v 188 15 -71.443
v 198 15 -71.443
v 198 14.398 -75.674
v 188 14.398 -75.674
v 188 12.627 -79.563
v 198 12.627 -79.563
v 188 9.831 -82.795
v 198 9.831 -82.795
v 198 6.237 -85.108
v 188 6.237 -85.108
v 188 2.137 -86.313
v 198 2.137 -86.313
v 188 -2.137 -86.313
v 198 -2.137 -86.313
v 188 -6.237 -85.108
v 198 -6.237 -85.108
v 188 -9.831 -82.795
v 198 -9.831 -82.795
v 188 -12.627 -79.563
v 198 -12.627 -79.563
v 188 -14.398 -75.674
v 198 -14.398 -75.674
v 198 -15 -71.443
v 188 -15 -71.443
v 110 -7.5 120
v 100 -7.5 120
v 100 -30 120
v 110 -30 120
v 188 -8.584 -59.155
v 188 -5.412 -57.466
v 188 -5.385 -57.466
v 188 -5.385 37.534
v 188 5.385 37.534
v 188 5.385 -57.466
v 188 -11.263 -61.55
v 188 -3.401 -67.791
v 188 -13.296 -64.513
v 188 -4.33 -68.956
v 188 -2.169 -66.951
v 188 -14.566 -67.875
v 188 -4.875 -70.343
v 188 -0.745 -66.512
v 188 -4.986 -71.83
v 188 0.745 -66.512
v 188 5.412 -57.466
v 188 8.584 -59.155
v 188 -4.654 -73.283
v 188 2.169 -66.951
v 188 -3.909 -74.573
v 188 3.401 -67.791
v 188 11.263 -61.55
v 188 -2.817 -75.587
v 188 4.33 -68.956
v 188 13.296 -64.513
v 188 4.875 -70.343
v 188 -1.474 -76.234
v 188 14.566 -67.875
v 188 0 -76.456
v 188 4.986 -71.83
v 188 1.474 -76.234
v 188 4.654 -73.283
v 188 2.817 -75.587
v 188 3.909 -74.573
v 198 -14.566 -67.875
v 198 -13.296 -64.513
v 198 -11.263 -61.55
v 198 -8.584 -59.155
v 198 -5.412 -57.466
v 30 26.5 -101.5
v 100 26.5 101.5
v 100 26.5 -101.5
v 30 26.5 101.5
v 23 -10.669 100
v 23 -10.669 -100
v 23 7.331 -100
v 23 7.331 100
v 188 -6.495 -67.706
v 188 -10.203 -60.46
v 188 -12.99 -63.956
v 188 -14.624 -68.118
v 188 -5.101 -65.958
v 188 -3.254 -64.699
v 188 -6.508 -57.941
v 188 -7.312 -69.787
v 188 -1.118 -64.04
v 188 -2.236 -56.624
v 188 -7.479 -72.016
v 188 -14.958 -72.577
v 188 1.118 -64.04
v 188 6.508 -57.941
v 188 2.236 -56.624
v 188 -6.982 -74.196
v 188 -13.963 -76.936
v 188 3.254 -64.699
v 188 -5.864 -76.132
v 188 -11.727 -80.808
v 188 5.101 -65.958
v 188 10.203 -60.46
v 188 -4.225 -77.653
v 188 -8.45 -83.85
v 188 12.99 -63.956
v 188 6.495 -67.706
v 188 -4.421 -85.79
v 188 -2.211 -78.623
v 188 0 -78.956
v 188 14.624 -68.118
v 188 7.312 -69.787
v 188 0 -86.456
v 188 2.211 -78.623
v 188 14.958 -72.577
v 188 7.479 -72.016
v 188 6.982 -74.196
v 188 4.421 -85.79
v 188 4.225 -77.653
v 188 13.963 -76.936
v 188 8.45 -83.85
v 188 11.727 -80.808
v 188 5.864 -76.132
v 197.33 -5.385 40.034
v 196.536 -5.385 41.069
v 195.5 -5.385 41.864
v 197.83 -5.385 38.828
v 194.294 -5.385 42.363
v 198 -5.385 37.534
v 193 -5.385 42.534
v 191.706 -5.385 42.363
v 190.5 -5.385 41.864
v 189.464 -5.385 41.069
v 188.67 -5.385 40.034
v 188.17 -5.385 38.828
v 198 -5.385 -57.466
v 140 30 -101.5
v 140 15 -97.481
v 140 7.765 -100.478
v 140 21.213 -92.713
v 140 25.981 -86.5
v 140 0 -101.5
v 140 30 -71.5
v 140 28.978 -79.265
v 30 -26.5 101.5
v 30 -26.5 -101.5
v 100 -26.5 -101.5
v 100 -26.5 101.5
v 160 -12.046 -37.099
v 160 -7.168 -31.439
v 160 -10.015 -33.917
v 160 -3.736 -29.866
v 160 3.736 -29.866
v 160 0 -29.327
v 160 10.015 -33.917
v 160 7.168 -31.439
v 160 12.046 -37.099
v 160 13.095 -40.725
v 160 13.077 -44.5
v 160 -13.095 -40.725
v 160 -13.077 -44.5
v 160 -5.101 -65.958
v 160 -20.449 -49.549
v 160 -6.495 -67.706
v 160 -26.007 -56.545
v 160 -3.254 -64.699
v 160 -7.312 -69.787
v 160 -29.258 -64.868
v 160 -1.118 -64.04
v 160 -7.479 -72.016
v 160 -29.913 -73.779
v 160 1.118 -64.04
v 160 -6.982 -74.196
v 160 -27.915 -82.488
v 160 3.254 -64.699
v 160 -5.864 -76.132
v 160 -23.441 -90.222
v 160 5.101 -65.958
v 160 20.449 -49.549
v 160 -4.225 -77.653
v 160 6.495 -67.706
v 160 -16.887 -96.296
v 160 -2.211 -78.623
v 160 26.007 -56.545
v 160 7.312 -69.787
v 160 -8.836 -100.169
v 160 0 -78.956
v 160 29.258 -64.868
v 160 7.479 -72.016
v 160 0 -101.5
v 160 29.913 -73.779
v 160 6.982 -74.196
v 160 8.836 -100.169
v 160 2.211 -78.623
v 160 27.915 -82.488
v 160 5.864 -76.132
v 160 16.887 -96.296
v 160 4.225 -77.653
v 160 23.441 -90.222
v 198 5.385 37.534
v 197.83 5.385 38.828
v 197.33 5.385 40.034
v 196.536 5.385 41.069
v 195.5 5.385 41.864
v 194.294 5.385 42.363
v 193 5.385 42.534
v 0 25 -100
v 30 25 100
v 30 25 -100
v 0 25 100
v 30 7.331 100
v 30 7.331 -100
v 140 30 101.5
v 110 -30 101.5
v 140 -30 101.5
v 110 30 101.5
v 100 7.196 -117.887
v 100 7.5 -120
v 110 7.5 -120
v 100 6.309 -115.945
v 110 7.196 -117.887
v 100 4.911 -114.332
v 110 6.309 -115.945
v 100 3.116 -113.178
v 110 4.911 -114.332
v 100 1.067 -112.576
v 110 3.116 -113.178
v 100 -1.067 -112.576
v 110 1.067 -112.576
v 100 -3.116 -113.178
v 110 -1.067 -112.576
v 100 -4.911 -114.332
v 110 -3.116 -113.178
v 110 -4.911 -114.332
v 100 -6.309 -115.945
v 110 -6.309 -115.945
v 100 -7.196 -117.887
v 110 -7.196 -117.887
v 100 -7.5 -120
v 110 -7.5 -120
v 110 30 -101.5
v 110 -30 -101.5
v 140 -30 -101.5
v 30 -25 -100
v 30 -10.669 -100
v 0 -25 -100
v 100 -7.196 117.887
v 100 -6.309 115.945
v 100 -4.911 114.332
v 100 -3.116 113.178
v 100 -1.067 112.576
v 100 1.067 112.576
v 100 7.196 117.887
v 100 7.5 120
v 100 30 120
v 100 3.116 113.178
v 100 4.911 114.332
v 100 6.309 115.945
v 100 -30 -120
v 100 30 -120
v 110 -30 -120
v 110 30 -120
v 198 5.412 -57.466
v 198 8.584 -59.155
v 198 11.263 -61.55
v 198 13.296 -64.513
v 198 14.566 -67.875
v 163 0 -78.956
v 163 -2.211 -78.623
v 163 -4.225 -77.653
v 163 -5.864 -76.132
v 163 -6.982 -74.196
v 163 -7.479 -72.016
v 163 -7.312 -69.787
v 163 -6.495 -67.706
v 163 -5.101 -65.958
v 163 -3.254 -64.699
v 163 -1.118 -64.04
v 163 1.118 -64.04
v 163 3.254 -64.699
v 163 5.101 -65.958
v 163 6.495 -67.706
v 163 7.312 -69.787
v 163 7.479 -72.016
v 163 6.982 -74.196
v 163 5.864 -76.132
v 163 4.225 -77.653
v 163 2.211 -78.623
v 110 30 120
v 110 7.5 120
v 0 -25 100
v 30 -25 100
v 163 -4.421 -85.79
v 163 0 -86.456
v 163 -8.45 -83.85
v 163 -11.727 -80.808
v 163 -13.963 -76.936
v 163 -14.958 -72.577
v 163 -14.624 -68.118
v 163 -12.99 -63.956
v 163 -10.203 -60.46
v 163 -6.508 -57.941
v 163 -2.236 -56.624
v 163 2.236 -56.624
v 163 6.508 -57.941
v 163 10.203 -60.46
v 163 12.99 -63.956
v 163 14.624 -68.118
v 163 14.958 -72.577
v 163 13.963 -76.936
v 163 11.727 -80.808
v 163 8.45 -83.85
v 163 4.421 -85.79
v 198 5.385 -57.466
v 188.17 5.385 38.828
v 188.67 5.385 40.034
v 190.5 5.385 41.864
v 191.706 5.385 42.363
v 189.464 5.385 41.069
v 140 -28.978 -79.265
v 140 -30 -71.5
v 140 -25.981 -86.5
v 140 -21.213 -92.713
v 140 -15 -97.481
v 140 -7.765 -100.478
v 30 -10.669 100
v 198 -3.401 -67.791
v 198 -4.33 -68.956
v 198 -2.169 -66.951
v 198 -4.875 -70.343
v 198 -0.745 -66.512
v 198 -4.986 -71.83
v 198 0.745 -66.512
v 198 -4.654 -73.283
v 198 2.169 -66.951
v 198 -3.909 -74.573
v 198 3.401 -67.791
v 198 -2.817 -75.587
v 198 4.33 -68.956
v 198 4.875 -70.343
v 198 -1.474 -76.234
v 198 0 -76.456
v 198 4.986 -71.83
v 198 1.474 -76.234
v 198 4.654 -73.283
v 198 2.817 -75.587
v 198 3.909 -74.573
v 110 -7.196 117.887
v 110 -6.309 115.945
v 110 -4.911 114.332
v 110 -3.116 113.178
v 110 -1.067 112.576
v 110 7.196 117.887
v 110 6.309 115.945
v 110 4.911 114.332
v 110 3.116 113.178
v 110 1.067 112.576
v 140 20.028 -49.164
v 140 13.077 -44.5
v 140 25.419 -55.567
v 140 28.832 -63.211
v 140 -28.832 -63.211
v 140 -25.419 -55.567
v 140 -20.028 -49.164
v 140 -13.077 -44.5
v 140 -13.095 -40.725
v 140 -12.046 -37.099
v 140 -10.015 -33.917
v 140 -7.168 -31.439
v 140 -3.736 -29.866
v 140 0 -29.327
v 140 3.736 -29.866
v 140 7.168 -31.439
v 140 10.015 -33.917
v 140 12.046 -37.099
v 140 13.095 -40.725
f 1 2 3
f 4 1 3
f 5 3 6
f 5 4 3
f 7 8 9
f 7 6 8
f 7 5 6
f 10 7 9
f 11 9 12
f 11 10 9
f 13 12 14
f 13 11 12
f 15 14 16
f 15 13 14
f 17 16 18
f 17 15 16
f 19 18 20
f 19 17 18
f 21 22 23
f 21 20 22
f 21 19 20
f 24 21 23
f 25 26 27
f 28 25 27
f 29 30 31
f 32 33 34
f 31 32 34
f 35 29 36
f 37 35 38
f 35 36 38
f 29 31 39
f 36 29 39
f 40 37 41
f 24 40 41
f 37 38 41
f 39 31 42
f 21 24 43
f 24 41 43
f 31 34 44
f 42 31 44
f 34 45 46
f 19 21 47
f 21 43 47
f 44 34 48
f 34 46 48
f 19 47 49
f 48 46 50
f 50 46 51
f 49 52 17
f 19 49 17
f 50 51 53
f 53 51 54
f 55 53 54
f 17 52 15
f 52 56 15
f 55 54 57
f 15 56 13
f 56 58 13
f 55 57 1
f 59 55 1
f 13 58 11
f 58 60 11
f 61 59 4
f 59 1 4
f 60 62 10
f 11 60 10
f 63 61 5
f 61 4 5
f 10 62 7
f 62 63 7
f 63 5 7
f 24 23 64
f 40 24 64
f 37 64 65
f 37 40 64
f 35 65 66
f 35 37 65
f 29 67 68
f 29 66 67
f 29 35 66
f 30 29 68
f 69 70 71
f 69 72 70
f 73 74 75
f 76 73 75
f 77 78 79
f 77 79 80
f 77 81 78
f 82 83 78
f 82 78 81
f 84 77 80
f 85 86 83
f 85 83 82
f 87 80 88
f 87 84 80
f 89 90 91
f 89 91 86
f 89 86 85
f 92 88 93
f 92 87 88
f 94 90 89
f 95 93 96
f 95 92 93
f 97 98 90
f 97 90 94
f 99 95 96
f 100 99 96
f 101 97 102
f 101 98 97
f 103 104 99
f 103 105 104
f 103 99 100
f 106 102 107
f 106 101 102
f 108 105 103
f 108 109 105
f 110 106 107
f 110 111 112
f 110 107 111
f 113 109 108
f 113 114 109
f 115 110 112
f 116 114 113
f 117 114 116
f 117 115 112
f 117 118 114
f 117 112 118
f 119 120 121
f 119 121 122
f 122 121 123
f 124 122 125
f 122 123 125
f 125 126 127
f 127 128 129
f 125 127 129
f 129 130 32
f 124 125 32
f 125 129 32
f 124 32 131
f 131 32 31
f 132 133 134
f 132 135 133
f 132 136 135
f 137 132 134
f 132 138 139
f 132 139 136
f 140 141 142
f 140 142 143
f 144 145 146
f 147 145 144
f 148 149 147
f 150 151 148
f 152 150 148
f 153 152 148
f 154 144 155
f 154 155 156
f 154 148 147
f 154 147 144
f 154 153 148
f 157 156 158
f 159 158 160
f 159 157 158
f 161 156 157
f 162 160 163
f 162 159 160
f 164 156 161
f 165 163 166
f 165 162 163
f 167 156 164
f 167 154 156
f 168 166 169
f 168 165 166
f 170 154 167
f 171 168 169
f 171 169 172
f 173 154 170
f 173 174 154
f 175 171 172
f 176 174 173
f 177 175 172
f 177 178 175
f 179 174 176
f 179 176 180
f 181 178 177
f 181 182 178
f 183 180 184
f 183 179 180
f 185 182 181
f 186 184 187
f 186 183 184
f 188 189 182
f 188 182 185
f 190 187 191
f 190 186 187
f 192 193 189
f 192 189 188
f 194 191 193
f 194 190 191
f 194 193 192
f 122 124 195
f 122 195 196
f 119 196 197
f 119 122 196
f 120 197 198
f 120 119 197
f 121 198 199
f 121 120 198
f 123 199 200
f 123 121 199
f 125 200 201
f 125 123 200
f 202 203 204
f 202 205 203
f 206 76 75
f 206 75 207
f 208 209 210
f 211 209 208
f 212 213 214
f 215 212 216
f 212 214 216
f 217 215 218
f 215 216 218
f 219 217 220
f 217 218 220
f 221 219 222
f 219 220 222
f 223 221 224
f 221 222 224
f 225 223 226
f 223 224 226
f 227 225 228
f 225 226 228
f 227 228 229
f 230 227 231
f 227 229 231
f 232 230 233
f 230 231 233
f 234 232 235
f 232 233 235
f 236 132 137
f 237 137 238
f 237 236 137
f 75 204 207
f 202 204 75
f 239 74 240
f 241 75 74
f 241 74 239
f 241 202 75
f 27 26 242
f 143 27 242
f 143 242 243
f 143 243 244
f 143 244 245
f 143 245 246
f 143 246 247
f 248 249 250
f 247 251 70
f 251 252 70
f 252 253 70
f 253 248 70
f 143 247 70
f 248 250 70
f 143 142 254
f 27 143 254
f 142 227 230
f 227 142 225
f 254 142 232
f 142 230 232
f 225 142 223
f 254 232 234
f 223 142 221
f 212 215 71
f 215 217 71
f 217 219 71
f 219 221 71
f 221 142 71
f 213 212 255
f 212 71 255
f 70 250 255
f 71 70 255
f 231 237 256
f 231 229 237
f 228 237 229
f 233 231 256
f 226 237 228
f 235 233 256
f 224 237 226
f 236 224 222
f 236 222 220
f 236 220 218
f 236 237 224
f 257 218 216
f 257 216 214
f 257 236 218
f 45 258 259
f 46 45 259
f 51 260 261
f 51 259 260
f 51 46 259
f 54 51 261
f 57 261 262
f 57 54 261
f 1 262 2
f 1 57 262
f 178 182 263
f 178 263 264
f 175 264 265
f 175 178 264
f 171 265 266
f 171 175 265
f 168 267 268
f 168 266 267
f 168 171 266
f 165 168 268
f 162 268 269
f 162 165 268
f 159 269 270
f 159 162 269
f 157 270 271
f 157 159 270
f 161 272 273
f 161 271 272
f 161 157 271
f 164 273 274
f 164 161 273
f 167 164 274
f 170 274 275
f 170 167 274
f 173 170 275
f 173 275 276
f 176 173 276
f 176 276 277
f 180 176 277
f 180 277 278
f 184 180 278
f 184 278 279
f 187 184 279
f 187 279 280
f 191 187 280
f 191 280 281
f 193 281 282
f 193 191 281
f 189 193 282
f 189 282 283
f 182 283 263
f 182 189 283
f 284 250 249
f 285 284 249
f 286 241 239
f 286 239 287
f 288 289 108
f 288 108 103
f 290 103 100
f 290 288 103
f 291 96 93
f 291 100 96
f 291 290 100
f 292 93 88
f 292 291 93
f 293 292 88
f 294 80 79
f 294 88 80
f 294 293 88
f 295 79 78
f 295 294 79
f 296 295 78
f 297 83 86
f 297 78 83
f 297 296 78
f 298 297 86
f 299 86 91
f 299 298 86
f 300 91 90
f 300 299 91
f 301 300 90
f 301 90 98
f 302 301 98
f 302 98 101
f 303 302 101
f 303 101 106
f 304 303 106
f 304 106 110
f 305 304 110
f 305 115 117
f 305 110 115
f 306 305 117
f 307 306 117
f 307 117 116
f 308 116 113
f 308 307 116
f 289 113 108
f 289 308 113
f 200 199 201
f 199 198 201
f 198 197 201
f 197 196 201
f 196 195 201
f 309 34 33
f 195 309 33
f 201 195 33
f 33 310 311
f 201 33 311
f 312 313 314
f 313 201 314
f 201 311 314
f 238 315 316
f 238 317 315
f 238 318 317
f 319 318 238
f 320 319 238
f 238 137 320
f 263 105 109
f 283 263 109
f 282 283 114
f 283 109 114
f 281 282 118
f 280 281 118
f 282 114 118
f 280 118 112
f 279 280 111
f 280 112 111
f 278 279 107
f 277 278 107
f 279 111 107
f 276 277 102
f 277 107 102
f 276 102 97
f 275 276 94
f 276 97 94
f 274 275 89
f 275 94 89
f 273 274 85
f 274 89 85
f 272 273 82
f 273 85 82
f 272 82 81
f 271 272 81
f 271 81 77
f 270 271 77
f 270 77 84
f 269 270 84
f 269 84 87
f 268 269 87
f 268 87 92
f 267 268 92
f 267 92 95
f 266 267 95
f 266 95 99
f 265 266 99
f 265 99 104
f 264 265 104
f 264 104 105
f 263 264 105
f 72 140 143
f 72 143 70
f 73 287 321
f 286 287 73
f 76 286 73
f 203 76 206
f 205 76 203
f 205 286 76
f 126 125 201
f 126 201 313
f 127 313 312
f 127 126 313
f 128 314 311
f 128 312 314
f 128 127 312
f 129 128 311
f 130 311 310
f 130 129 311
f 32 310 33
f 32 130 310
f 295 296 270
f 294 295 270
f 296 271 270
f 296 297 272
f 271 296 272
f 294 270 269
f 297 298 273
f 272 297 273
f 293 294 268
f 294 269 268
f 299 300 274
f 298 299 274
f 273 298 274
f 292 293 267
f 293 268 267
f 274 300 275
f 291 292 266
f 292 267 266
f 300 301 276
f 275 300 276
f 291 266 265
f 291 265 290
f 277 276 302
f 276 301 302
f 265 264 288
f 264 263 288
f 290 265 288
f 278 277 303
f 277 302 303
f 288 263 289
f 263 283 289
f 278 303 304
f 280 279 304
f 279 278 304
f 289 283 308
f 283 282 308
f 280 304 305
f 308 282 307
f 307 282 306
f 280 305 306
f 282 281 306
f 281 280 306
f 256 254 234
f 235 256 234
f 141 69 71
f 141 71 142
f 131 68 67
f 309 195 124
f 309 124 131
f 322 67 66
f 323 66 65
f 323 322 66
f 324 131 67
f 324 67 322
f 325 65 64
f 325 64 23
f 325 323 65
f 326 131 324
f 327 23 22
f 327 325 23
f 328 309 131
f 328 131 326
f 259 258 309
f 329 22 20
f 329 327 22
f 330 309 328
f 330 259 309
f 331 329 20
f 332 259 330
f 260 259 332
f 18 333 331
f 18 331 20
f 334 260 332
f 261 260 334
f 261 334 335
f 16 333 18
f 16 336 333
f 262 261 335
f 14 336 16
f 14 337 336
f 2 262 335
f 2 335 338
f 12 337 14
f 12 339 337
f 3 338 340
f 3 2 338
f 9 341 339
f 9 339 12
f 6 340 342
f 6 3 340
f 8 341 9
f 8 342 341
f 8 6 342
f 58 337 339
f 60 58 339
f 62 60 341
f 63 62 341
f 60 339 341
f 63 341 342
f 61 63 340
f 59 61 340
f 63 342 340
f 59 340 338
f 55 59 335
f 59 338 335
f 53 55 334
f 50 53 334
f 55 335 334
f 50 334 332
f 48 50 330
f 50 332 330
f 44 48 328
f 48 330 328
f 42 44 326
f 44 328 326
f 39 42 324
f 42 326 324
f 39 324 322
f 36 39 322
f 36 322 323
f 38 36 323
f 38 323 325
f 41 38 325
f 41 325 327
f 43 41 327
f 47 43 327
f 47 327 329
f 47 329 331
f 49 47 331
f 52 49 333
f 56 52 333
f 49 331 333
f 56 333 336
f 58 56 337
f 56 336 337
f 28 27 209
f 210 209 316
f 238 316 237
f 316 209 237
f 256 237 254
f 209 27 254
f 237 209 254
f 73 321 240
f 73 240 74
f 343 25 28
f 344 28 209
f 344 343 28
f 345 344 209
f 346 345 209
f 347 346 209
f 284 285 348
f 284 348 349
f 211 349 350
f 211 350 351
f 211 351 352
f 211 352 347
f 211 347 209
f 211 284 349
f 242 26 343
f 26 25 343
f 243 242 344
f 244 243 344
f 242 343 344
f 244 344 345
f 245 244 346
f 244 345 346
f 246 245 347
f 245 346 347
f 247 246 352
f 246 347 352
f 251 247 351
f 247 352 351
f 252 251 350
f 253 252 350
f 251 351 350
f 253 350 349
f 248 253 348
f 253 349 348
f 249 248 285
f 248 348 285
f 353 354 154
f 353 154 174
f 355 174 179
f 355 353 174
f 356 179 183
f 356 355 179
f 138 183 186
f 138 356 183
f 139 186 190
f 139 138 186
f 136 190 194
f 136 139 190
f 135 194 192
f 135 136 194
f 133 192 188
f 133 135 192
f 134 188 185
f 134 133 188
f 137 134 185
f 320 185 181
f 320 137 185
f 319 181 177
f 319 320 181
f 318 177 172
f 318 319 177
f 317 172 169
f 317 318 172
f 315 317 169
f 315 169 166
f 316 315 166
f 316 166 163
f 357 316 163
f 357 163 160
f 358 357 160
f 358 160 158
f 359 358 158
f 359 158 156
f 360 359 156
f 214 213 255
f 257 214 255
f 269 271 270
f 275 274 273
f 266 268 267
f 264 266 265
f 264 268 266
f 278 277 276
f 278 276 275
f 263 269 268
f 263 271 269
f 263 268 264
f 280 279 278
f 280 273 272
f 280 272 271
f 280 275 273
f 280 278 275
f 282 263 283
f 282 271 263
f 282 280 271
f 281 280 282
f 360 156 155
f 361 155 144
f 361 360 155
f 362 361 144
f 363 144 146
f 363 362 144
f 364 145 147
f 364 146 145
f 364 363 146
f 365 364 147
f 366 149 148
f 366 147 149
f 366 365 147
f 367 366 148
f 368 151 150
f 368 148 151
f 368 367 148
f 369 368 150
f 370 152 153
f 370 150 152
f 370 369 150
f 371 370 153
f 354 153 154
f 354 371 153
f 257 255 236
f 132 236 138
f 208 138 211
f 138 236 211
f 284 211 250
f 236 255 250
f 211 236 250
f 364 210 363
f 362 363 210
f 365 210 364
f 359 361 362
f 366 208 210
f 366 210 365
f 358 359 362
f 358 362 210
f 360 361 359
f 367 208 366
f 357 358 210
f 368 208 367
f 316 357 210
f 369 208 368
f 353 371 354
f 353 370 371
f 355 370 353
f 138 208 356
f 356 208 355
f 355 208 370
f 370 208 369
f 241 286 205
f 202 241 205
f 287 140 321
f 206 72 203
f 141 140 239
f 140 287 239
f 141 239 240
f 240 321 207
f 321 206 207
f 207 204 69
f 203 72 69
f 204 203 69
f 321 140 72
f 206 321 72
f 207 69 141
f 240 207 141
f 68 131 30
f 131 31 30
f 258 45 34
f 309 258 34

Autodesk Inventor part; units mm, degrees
ref_plane "YZ Plane" through (0, 0, 0) normal (1, 0, 0) x (0, 1, 0)
ref_plane "XZ Plane" through (0, 0, 0) normal (0, 1, 0) x (-1, 0, 0)
ref_plane "XY Plane" through (0, 0, 0) normal (0, 0, 1) x (1, 0, 0)
sketch "Sketch1" plane through (0, 0, 0) normal (1, 0, 0) x (0, 1, 0)
  line L0 (-25, 100) -> (25, 100)
  line L1 (25, 100) -> (25, -100)
  line L2 (25, -100) -> (-25, -100)
  line L3 (-25, -100) -> (-25, 100)
  line L4 (-25, 100) -> (25, -100) construction
  line L5 (25, 100) -> (-25, -100) construction
  point P0 (0, 0)
  dimension "d0" = 50
  dimension "d1" = 200
extrude "Extrusion1" add sketch "Sketch1" along normal blind 30
sketch "Sketch2" plane through (30, 0, 0) normal (1, 0, 0) x (0, 0, -1)
  line L0 (101.5, -26.5) -> (-101.5, -26.5)
  line L1 (-101.5, -26.5) -> (-101.5, 26.5)
  line L2 (-101.5, 26.5) -> (101.5, 26.5)
  line L3 (101.5, 26.5) -> (101.5, -26.5)
  line L4 (101.5, -26.5) -> (-101.5, 26.5) construction
  line L5 (-101.5, -26.5) -> (101.5, 26.5) construction
  point P0 (0, 0)
  dimension "d4" = 203
  dimension "d5" = 53
extrude "Extrusion2" add sketch "Sketch2" along normal blind 70
sketch "Sketch3" plane through (100, 0, 0) normal (1, 0, 0) x (0, 0, -1)
  line L0 (120, 30) -> (-120, 30)
  line L1 (-120, 30) -> (-120, -30)
  line L2 (-120, -30) -> (120, -30)
  line L3 (120, -30) -> (120, 30)
  line L4 (120, 30) -> (-120, -30) construction
  line L5 (-120, 30) -> (120, -30) construction
  point P0 (0, 0)
  dimension "d8" = 240
  dimension "d9" = 60
extrude "Extrusion3" add sketch "Sketch3" along normal blind 10
sketch "Sketch4" plane through (110, 0, 0) normal (1, 0, 0) x (0, 0, -1)
  line L0 (101.5, -30) -> (-101.5, -30)
  line L1 (-101.5, -30) -> (-101.5, 30)
  line L2 (-101.5, 30) -> (101.5, 30)
  line L3 (101.5, 30) -> (101.5, -30)
  line L4 (101.5, -30) -> (-101.5, 30) construction
  line L5 (-101.5, -30) -> (101.5, 30) construction
  point P0 (0, 0)
  dimension "d12" = 203
  dimension "d13" = 60
extrude "Extrusion4" add sketch "Sketch4" along normal blind 30
sketch "Sketch6" plane through (140, 0, 0) normal (1, 0, 0) x (0, 0, -1)
  arc A0 (44.5, -13.0767) -> (44.5, 13.0767) centre (71.5, 0) ccw
  line L0 (101.5, -30) -> (101.5, 30) projected
  arc A1 (44.5, 13.0767) -> (44.5, -13.0767) centre (42.5487, 0) ccw
  point P0 (0, 0)
  point P1 (44.5, 13.0767)
  dimension "d16" = 60
  dimension "d17" = 30
extrude "Extrusion5" add sketch "Sketch6" along normal blind 20
sketch "Sketch8" plane through (160, 0, 0) normal (1, 0, 0) x (0, 0, -1)
  circle A0 centre (71.456, 0) radius 7.5
  point P0 (0, 0)
  dimension "d22" = 15
extrude "Extrusion6" add sketch "Sketch8" along normal blind 3
sketch "Sketch9" plane through (163, 0, -71.456) normal (1, 0, 0) x (0, 0, -1)
  circle A0 centre (0, 0) radius 15
  point P0 (-71.456, 0)
  dimension "d25" = 30
extrude "Extrusion7" add sketch "Sketch9" along normal blind 25
sketch "Sketch10" plane through (188, 0, -71.456) normal (1, 0, 0) x (0, 0, -1)
  circle A0 centre (0, 0) radius 7.5 projected
  circle A1 centre (0, 0) radius 5
  point P0 (-71.456, 0)
  dimension "d28" = 10
extrude "Extrusion8" cut sketch "Sketch10" against normal blind 25 contours A0 | A1
sketch "Sketch11" plane through (188, 0, -71.456) normal (1, 0, 0) x (0, 0, -1)
  arc A0 (-13.9898, -5.3852) -> (-13.9898, 5.3852) centre (0.0102, 0) ccw
  circle A1 centre (0, 0) radius 15 projected
  line L0 (-13.9898, 5.4117) -> (-13.9898, 5.3852)
  line L1 (-13.9898, -5.3852) -> (-13.9898, -5.4117)
  line L2 (-13.9898, 5.3852) -> (-113.9898, 5.3852)
  line L3 (-113.9898, 5.3852) -> (-113.9898, -5.3852)
  line L4 (-113.9898, -5.3852) -> (-13.9898, -5.3852)
  point P0 (-71.456, 0)
  point P1 (0.0051, -15)
  point P2 (0.0051, 15)
  dimension "d31" = 30
  dimension "d38" = 100
  dimension "d39" = 10.7703
extrude "Extrusion9" add sketch "Sketch11" along normal blind 10 separate body contours L4 A1 L2 A0 | A0 A1 L1 | A1 A0 | L4 L3 L2 A1 | A0 L0 A1
sketch "Sketch12" plane through (198, 0, -71.456) normal (1, 0, 0) x (0, 0, -1)
  circle A0 centre (0, 0) radius 5
  point P0 (-71.456, 0)
  dimension "d37" = 10
extrude "Extrusion10" cut sketch "Sketch12" against normal blind 10 bodies 2
fillet "Fillet1" radius 5 2 edges at (198, 0, 42.5338) (188, 0, 42.5338)
sketch "Sketch13" plane through (110, 0, 0) normal (1, 0, 0) x (0, 0, -1)
  line L0 (120, -30) -> (120, 30) projected
  circle A0 centre (120, 0) radius 7.5
  line L1 (-120, 30) -> (-120, -30) projected
  circle A1 centre (-120, 0) radius 7.5
  point P0 (0, 0)
  dimension "d41" = 15
  dimension "d42" = 15
extrude "Extrusion11" cut sketch "Sketch13" against normal through all bodies 1
sketch "Sketch14" plane through (0, -25, -100) normal (0, 0, -1) x (-1, 0, 0)
  line L0 (-30, 50) -> (-30, 0) projected
  line L1 (-30, 14.331) -> (-23, 14.331)
  line L2 (-23, 14.331) -> (-23, 32.331)
  line L3 (-23, 32.331) -> (-30, 32.331)
  line L4 (-30, 32.331) -> (-30, 14.331)
  point P0 (0, 25)
  dimension "d45" = 7
  dimension "d46" = 18
extrude "Extrusion12" cut sketch "Sketch14" against normal through all bodies 1
properties part number "Servomotor1"
